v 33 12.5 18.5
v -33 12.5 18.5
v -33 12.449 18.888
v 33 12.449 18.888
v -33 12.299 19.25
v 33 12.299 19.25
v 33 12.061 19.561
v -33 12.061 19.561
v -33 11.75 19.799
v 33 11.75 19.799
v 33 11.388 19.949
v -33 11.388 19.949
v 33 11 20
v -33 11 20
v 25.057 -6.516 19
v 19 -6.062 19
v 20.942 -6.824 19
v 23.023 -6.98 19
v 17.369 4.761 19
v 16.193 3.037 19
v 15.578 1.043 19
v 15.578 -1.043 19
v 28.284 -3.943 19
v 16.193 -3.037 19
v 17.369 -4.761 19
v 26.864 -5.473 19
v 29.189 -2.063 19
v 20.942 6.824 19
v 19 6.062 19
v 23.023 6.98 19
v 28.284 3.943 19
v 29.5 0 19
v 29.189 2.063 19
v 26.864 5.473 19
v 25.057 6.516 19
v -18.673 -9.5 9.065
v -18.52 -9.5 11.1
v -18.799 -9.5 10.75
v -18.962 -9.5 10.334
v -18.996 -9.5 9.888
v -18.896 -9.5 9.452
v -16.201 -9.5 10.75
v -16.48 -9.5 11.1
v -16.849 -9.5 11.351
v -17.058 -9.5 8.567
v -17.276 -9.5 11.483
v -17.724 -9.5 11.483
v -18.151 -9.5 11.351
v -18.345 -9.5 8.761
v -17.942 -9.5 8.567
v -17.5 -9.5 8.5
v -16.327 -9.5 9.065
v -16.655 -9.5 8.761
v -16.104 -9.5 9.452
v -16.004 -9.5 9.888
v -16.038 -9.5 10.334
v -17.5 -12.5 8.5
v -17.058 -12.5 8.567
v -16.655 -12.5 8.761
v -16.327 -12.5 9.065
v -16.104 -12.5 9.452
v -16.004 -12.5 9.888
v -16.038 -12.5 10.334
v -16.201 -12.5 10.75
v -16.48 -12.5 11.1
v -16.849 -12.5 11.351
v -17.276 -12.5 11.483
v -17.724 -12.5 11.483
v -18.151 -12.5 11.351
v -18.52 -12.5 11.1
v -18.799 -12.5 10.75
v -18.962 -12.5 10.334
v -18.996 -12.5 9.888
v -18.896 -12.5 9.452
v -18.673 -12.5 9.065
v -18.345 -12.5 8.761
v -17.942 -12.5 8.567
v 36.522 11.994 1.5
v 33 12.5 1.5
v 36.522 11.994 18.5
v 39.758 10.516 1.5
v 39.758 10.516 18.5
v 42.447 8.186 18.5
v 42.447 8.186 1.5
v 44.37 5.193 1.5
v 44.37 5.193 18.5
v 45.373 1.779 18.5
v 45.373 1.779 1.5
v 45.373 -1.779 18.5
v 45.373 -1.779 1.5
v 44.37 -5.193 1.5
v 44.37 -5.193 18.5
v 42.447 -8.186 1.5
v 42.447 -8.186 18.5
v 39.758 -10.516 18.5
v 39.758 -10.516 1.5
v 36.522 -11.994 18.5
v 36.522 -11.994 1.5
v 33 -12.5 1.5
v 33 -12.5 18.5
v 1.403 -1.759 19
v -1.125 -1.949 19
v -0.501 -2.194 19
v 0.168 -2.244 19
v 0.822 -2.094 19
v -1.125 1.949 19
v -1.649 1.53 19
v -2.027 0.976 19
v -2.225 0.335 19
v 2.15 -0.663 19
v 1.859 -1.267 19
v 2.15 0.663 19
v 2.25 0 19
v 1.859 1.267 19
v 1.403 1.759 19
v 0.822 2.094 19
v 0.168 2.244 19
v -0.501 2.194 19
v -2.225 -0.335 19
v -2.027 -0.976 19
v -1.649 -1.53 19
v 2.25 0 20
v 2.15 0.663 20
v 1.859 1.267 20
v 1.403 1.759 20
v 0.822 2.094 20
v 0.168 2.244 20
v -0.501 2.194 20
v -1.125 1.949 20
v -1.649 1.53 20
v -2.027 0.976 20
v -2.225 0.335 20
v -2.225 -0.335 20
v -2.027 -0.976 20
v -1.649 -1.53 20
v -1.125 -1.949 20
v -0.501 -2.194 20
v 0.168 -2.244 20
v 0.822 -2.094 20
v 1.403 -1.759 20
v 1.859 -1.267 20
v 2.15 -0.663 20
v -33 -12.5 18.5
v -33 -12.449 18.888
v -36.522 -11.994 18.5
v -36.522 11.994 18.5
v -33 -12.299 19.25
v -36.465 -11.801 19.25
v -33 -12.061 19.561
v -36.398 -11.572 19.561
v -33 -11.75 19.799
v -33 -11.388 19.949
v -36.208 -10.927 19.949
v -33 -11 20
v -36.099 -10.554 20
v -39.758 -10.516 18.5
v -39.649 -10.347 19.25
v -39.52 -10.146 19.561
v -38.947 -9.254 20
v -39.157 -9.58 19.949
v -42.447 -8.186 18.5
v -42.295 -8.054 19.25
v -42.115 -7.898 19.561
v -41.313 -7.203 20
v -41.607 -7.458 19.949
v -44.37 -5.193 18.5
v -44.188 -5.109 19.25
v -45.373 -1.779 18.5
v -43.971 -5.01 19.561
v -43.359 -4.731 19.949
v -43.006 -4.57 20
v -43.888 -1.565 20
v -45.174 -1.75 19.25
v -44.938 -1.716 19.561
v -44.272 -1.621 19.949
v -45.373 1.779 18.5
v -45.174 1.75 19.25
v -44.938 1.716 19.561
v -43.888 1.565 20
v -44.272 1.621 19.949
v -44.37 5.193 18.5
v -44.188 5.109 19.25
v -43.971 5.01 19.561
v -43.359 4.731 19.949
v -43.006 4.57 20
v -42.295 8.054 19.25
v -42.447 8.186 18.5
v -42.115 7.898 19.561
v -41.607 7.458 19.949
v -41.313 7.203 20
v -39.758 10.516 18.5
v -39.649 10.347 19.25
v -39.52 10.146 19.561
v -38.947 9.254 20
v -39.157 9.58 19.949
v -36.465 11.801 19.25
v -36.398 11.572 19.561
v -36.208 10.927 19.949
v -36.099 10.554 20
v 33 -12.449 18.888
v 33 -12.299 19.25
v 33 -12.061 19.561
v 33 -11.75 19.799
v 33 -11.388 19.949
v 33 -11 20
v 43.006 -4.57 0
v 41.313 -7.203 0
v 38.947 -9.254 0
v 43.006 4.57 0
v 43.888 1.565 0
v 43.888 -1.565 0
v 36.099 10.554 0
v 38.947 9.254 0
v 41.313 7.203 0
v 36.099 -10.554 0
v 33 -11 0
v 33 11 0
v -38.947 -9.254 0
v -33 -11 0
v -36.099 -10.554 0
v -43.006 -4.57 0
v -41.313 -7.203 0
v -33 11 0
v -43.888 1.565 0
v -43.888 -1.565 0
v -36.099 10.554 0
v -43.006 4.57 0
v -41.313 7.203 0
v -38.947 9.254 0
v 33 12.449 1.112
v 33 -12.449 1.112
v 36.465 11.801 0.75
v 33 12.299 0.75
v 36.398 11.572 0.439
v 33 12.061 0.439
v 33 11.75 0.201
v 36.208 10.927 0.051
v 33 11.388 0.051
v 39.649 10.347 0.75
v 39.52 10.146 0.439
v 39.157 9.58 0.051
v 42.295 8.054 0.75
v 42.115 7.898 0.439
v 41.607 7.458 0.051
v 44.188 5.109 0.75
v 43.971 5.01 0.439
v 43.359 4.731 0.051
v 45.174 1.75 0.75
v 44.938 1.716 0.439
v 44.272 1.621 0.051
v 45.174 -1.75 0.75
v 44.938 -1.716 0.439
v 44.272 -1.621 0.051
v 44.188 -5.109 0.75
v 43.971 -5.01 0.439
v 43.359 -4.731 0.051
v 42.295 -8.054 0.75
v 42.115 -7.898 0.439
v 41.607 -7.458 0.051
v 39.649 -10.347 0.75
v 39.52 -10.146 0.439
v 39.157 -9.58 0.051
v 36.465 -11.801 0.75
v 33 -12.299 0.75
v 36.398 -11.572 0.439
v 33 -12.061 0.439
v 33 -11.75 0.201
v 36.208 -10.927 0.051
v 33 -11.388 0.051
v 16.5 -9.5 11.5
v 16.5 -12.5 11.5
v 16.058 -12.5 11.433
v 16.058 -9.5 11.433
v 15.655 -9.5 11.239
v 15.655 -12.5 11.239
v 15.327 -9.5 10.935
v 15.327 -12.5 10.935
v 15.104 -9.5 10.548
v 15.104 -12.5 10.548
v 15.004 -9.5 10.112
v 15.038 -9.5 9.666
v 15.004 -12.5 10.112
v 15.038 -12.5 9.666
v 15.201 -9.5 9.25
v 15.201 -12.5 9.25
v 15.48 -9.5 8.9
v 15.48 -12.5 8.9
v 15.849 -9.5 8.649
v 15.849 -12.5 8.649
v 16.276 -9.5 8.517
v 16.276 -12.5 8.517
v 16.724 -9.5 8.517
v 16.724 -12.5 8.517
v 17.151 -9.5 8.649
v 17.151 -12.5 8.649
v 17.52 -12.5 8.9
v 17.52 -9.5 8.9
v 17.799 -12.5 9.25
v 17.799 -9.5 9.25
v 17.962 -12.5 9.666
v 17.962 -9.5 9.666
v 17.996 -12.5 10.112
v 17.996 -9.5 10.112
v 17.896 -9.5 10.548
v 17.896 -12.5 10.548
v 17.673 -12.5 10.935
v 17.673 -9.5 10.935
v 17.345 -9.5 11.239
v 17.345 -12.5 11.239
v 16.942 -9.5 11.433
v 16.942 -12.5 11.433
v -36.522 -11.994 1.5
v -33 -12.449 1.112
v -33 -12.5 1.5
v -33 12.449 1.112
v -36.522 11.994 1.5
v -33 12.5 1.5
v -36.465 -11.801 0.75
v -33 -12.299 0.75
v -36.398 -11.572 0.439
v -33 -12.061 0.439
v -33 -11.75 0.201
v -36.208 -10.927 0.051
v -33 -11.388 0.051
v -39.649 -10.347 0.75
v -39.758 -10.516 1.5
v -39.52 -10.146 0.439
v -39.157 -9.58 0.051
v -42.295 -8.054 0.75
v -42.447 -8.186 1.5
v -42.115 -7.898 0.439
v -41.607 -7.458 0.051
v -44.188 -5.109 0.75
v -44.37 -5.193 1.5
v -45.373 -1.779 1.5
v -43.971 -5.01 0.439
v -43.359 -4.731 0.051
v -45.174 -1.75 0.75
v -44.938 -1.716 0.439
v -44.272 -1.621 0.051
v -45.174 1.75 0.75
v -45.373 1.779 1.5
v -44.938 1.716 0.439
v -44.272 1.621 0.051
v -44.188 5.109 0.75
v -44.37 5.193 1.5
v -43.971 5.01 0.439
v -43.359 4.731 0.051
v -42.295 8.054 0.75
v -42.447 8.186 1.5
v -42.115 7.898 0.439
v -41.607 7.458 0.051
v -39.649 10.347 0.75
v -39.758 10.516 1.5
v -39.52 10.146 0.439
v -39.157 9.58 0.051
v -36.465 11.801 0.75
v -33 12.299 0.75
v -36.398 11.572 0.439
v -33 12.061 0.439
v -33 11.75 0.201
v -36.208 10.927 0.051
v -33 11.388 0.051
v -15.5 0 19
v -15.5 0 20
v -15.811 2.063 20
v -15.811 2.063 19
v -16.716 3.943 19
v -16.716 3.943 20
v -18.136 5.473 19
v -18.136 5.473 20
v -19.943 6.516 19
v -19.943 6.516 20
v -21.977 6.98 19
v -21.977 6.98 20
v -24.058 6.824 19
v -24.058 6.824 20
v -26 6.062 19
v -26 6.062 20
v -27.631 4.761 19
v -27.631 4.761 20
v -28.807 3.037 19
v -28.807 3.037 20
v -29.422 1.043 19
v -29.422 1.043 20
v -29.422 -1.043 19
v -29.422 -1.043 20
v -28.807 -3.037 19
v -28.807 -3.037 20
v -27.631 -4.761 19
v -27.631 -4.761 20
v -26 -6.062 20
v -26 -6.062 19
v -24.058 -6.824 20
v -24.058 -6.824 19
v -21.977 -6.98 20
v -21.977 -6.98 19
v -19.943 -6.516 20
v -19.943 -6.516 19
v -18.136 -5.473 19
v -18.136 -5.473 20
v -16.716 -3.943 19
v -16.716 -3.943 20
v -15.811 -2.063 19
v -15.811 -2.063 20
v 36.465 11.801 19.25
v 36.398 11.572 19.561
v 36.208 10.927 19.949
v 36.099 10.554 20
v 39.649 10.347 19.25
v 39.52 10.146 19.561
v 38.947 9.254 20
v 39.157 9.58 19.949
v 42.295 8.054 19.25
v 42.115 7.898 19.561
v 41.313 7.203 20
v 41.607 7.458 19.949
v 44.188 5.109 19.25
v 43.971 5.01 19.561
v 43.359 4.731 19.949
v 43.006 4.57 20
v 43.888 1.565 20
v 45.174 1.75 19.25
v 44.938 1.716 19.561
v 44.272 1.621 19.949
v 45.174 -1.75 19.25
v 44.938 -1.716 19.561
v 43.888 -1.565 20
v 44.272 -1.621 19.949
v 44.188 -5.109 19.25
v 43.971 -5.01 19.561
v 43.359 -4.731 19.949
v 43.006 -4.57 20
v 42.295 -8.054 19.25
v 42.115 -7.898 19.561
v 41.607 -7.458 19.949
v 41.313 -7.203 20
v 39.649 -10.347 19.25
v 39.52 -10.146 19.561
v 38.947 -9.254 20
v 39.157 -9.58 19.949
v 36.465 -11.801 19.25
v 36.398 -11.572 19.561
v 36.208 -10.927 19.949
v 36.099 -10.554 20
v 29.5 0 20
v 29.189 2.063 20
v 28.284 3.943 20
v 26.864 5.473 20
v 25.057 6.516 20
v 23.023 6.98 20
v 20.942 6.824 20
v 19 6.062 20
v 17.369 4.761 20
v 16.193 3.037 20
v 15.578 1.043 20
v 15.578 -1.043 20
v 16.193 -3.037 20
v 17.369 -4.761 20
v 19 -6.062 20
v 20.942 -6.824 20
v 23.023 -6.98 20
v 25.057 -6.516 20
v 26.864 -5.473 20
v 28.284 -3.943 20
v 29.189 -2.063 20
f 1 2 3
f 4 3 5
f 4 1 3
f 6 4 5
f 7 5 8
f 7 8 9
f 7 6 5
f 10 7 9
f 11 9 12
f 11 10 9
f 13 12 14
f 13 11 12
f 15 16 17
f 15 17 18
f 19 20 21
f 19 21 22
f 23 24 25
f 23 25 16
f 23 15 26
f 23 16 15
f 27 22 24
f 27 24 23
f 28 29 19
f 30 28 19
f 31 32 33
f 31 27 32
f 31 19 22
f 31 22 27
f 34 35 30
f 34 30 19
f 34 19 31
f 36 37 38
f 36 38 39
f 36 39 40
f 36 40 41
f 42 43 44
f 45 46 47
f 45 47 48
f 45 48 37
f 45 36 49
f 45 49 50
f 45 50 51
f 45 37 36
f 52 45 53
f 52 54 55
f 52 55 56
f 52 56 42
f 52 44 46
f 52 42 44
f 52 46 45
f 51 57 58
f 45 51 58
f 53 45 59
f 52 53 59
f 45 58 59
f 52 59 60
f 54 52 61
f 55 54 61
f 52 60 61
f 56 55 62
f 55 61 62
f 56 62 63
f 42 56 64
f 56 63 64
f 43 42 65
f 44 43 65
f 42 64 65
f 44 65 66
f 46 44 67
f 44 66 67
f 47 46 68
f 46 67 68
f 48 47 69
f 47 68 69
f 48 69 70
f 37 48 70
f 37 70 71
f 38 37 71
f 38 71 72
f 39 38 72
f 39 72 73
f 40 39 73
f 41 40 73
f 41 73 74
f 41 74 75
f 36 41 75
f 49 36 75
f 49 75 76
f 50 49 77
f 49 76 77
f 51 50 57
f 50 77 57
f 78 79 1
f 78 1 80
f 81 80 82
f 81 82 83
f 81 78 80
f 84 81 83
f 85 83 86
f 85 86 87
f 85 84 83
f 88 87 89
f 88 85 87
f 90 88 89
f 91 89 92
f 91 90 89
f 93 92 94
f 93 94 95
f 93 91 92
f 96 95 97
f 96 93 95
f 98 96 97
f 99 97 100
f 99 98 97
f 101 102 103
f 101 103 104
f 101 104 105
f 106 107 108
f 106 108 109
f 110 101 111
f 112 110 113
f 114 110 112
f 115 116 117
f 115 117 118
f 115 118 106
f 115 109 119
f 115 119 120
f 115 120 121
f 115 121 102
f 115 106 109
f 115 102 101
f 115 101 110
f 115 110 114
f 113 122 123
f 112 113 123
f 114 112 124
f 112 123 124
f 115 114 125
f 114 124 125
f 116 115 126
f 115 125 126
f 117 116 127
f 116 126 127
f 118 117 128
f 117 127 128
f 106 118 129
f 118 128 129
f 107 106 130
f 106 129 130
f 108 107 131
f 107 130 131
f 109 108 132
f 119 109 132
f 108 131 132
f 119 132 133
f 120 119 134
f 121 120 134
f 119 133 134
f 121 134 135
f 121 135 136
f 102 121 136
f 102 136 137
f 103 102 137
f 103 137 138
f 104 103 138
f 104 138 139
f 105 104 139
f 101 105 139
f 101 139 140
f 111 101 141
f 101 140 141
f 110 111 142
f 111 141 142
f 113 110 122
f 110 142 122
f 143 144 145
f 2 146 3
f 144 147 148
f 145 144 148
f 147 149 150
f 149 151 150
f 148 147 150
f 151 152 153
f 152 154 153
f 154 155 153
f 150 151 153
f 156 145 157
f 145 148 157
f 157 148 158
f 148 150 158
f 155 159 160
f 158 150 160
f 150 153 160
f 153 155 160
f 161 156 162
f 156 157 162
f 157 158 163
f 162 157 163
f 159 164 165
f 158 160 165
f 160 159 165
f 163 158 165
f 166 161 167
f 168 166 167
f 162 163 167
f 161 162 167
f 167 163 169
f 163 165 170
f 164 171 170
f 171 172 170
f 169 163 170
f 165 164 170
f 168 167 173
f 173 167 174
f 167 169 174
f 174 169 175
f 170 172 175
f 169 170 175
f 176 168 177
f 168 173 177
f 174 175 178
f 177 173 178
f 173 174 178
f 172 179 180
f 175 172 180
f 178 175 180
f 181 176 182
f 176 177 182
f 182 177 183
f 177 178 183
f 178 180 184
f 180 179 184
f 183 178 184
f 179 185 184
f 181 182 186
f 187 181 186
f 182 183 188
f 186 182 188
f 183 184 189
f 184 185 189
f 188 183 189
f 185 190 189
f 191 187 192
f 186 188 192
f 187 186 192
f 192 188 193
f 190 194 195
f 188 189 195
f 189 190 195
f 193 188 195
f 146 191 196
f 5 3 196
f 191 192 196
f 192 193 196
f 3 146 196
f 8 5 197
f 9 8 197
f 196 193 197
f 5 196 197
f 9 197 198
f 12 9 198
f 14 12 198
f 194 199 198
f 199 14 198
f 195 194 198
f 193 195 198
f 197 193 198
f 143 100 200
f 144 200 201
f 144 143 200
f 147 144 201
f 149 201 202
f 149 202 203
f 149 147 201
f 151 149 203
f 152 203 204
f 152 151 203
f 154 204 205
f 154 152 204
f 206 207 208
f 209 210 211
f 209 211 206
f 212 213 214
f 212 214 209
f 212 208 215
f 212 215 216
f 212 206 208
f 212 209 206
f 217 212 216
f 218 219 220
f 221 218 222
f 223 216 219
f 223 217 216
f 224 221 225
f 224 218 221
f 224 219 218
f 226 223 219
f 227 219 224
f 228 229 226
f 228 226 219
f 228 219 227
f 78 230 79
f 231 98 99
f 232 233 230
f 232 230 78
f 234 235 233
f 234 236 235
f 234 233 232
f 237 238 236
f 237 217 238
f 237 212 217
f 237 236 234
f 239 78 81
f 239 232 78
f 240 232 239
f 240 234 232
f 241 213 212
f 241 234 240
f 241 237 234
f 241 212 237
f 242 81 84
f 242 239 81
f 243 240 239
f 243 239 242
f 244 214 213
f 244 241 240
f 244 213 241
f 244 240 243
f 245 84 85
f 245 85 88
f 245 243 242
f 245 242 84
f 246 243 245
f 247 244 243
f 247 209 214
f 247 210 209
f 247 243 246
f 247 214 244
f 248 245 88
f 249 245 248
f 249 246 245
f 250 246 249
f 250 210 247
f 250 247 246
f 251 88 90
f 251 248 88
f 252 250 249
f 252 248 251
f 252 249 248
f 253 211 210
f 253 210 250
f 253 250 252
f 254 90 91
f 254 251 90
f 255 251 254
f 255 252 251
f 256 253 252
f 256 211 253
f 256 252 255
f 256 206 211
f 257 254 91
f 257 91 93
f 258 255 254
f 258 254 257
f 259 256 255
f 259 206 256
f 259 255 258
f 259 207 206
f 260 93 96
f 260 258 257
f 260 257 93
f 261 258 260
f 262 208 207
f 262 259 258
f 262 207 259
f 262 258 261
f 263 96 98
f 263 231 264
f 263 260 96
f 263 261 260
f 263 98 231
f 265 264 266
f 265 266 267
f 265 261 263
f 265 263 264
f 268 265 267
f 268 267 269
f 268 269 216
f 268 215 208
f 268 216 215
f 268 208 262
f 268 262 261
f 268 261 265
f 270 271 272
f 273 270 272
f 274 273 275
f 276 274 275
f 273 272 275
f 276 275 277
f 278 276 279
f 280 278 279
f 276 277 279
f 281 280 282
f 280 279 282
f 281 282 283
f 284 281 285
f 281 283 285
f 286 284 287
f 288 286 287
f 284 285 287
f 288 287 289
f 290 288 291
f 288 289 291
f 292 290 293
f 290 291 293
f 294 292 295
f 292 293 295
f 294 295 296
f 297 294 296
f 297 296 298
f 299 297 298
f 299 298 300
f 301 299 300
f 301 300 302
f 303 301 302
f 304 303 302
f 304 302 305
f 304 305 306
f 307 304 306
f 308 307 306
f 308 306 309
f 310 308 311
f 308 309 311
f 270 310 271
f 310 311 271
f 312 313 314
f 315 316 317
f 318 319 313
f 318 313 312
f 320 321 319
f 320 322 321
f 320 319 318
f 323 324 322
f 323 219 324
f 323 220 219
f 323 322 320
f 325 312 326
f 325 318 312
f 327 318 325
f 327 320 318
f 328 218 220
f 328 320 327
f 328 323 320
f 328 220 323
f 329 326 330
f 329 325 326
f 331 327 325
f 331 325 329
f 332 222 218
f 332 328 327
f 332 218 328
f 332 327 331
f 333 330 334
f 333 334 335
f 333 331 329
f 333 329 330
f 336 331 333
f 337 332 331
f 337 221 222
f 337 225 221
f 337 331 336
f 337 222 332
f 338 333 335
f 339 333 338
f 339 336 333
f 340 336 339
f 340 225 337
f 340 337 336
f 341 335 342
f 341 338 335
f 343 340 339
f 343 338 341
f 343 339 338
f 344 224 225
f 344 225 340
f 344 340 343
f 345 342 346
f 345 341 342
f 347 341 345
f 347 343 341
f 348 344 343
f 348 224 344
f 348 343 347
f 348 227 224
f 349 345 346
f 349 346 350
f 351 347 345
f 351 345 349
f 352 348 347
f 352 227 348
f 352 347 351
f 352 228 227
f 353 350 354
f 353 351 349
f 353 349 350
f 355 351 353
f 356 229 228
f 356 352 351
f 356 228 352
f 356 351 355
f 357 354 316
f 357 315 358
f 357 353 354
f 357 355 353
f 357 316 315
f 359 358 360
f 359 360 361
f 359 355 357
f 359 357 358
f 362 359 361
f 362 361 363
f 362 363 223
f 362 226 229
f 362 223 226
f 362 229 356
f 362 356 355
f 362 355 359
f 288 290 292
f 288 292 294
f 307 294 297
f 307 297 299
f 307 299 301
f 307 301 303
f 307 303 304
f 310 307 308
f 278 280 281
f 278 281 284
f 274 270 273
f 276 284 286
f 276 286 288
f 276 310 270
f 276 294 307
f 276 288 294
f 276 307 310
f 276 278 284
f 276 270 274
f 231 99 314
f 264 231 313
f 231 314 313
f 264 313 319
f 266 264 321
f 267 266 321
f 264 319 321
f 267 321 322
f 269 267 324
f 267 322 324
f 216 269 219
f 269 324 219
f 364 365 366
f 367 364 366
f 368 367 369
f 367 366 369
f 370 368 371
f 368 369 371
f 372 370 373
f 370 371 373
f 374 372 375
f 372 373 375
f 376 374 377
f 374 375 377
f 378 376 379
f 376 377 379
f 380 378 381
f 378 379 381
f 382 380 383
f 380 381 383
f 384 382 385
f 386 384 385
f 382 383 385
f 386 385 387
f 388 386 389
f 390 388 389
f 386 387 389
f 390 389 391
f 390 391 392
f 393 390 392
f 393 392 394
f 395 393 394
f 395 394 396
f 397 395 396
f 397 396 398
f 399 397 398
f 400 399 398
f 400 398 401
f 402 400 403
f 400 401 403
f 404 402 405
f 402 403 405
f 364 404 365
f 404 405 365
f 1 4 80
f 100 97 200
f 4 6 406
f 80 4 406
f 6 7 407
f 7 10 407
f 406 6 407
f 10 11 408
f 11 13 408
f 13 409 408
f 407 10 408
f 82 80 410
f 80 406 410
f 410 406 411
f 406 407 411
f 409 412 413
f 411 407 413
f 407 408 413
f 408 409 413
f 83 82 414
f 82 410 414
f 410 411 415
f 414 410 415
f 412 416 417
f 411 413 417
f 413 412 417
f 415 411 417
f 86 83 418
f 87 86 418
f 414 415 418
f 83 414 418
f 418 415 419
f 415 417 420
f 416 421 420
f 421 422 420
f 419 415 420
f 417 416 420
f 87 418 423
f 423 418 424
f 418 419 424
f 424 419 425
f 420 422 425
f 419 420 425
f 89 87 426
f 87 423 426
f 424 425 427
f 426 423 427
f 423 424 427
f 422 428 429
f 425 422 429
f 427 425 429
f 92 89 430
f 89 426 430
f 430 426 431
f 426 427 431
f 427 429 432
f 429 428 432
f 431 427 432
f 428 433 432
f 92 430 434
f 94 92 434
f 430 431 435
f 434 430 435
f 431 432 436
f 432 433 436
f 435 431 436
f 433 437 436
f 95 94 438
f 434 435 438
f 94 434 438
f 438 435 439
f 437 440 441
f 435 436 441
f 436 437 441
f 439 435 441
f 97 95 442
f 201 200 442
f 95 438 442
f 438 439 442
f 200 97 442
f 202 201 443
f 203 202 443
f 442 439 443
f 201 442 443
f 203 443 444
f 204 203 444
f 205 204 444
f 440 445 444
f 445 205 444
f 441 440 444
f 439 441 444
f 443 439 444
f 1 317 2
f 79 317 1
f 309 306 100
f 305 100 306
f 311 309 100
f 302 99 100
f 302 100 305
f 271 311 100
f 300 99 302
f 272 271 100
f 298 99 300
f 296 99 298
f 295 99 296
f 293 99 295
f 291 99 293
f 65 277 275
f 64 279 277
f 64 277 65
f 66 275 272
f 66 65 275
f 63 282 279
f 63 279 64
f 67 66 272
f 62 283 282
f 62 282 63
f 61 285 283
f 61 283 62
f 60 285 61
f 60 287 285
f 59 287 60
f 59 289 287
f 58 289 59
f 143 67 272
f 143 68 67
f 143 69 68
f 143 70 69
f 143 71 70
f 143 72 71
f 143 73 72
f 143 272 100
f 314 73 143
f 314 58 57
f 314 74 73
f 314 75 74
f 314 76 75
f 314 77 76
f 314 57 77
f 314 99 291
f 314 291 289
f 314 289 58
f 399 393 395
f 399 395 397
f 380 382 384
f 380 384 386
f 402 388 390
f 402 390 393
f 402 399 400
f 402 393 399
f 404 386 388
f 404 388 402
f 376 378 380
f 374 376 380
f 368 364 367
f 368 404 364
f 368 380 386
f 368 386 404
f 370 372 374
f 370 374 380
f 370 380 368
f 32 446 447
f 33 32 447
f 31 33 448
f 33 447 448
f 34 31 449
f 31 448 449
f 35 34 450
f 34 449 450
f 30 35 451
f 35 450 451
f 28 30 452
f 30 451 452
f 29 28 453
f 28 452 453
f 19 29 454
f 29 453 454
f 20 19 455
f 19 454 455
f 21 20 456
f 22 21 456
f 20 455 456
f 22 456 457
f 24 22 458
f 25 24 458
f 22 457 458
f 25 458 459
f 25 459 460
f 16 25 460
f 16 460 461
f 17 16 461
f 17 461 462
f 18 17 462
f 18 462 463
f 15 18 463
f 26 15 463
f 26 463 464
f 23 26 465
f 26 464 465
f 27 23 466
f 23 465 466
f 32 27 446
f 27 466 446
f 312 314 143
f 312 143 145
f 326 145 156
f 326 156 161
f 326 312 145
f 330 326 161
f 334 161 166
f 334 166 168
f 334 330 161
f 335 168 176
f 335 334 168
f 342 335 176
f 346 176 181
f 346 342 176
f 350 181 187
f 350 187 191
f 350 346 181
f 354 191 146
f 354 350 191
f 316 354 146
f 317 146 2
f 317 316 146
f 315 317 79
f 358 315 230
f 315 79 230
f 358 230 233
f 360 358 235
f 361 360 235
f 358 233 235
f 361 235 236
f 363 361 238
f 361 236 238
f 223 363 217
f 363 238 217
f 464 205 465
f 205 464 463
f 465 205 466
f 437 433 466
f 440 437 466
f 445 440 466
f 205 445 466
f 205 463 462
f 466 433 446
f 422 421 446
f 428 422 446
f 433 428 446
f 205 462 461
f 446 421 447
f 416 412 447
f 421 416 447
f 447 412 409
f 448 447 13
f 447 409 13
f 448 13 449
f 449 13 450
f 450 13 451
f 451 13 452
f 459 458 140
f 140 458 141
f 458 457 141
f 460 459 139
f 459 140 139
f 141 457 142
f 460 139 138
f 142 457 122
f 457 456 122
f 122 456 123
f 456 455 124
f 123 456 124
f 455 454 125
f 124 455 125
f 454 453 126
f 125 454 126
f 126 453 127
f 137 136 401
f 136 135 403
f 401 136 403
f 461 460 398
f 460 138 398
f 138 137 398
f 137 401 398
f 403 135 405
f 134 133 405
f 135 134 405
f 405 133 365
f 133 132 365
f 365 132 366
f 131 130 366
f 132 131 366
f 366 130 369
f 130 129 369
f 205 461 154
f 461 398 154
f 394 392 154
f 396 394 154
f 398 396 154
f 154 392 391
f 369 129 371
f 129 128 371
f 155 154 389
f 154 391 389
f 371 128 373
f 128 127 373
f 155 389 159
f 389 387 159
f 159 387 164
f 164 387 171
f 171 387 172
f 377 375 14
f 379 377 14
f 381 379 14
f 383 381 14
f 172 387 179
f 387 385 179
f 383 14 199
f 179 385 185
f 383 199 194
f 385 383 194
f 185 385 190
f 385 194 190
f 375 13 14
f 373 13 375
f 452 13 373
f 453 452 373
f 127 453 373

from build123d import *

# Parameters (mm, degrees)
BOSS_EXTRUDE1_DEPTH = 20
FILLET1_R           = 1.5
SKETCH2_R           = 7
SKETCH2_R_2         = 2.25
CUT_EXTRUDE1_DEPTH  = 1
SKETCH3_R           = 1.5
CUT_EXTRUDE2_DEPTH  = 3


with BuildPart() as part:
    # Sketch1 → Boss-Extrude1 (new body)
    with BuildSketch(Plane.XY):
        with BuildLine():
            Line((-33, 12.5), (33, 12.5))
            ThreePointArc((33, 12.5), (45.5, 0), (33, -12.5))
            Line((33, -12.5), (-33, -12.5))
            ThreePointArc((-33, -12.5), (-45.5, 0), (-33, 12.5))
        make_face()
    extrude(amount=BOSS_EXTRUDE1_DEPTH)

    # Fillet1
    fillet1_edges = [part.edges().sort_by_distance(p)[0] for p in [
        (-45.5, 0, 20),
        (0, -12.5, 20),
        (45.5, 0, 20),
        (0, -12.5, 0),
        (-45.5, 0, 0),
        (0, 12.5, 0),
        (45.5, 0, 0),
        (0, 12.5, 20),
    ]]
    fillet(fillet1_edges, radius=FILLET1_R)

    # Sketch2 → Cut-Extrude1 (cut)
    with BuildSketch(Plane.XY.offset(20)):
        with Locations((-22.5, 0)):
            Circle(SKETCH2_R)
        with Locations((22.5, 0)):
            Circle(SKETCH2_R)
        Circle(SKETCH2_R_2)
    extrude(amount=-CUT_EXTRUDE1_DEPTH, mode=Mode.SUBTRACT)

    # Sketch3 → Cut-Extrude2 (cut)
    with BuildSketch(Plane.XZ.offset(12.5)):
        with Locations(Location((-17.5, 10, 0), (0, 0, 270))):
            Circle(SKETCH3_R)
        with Locations(Location((16.5, 10, 0), (0, 0, 90))):
            Circle(SKETCH3_R)
    extrude(amount=-CUT_EXTRUDE2_DEPTH, mode=Mode.SUBTRACT)


solid = part.part
